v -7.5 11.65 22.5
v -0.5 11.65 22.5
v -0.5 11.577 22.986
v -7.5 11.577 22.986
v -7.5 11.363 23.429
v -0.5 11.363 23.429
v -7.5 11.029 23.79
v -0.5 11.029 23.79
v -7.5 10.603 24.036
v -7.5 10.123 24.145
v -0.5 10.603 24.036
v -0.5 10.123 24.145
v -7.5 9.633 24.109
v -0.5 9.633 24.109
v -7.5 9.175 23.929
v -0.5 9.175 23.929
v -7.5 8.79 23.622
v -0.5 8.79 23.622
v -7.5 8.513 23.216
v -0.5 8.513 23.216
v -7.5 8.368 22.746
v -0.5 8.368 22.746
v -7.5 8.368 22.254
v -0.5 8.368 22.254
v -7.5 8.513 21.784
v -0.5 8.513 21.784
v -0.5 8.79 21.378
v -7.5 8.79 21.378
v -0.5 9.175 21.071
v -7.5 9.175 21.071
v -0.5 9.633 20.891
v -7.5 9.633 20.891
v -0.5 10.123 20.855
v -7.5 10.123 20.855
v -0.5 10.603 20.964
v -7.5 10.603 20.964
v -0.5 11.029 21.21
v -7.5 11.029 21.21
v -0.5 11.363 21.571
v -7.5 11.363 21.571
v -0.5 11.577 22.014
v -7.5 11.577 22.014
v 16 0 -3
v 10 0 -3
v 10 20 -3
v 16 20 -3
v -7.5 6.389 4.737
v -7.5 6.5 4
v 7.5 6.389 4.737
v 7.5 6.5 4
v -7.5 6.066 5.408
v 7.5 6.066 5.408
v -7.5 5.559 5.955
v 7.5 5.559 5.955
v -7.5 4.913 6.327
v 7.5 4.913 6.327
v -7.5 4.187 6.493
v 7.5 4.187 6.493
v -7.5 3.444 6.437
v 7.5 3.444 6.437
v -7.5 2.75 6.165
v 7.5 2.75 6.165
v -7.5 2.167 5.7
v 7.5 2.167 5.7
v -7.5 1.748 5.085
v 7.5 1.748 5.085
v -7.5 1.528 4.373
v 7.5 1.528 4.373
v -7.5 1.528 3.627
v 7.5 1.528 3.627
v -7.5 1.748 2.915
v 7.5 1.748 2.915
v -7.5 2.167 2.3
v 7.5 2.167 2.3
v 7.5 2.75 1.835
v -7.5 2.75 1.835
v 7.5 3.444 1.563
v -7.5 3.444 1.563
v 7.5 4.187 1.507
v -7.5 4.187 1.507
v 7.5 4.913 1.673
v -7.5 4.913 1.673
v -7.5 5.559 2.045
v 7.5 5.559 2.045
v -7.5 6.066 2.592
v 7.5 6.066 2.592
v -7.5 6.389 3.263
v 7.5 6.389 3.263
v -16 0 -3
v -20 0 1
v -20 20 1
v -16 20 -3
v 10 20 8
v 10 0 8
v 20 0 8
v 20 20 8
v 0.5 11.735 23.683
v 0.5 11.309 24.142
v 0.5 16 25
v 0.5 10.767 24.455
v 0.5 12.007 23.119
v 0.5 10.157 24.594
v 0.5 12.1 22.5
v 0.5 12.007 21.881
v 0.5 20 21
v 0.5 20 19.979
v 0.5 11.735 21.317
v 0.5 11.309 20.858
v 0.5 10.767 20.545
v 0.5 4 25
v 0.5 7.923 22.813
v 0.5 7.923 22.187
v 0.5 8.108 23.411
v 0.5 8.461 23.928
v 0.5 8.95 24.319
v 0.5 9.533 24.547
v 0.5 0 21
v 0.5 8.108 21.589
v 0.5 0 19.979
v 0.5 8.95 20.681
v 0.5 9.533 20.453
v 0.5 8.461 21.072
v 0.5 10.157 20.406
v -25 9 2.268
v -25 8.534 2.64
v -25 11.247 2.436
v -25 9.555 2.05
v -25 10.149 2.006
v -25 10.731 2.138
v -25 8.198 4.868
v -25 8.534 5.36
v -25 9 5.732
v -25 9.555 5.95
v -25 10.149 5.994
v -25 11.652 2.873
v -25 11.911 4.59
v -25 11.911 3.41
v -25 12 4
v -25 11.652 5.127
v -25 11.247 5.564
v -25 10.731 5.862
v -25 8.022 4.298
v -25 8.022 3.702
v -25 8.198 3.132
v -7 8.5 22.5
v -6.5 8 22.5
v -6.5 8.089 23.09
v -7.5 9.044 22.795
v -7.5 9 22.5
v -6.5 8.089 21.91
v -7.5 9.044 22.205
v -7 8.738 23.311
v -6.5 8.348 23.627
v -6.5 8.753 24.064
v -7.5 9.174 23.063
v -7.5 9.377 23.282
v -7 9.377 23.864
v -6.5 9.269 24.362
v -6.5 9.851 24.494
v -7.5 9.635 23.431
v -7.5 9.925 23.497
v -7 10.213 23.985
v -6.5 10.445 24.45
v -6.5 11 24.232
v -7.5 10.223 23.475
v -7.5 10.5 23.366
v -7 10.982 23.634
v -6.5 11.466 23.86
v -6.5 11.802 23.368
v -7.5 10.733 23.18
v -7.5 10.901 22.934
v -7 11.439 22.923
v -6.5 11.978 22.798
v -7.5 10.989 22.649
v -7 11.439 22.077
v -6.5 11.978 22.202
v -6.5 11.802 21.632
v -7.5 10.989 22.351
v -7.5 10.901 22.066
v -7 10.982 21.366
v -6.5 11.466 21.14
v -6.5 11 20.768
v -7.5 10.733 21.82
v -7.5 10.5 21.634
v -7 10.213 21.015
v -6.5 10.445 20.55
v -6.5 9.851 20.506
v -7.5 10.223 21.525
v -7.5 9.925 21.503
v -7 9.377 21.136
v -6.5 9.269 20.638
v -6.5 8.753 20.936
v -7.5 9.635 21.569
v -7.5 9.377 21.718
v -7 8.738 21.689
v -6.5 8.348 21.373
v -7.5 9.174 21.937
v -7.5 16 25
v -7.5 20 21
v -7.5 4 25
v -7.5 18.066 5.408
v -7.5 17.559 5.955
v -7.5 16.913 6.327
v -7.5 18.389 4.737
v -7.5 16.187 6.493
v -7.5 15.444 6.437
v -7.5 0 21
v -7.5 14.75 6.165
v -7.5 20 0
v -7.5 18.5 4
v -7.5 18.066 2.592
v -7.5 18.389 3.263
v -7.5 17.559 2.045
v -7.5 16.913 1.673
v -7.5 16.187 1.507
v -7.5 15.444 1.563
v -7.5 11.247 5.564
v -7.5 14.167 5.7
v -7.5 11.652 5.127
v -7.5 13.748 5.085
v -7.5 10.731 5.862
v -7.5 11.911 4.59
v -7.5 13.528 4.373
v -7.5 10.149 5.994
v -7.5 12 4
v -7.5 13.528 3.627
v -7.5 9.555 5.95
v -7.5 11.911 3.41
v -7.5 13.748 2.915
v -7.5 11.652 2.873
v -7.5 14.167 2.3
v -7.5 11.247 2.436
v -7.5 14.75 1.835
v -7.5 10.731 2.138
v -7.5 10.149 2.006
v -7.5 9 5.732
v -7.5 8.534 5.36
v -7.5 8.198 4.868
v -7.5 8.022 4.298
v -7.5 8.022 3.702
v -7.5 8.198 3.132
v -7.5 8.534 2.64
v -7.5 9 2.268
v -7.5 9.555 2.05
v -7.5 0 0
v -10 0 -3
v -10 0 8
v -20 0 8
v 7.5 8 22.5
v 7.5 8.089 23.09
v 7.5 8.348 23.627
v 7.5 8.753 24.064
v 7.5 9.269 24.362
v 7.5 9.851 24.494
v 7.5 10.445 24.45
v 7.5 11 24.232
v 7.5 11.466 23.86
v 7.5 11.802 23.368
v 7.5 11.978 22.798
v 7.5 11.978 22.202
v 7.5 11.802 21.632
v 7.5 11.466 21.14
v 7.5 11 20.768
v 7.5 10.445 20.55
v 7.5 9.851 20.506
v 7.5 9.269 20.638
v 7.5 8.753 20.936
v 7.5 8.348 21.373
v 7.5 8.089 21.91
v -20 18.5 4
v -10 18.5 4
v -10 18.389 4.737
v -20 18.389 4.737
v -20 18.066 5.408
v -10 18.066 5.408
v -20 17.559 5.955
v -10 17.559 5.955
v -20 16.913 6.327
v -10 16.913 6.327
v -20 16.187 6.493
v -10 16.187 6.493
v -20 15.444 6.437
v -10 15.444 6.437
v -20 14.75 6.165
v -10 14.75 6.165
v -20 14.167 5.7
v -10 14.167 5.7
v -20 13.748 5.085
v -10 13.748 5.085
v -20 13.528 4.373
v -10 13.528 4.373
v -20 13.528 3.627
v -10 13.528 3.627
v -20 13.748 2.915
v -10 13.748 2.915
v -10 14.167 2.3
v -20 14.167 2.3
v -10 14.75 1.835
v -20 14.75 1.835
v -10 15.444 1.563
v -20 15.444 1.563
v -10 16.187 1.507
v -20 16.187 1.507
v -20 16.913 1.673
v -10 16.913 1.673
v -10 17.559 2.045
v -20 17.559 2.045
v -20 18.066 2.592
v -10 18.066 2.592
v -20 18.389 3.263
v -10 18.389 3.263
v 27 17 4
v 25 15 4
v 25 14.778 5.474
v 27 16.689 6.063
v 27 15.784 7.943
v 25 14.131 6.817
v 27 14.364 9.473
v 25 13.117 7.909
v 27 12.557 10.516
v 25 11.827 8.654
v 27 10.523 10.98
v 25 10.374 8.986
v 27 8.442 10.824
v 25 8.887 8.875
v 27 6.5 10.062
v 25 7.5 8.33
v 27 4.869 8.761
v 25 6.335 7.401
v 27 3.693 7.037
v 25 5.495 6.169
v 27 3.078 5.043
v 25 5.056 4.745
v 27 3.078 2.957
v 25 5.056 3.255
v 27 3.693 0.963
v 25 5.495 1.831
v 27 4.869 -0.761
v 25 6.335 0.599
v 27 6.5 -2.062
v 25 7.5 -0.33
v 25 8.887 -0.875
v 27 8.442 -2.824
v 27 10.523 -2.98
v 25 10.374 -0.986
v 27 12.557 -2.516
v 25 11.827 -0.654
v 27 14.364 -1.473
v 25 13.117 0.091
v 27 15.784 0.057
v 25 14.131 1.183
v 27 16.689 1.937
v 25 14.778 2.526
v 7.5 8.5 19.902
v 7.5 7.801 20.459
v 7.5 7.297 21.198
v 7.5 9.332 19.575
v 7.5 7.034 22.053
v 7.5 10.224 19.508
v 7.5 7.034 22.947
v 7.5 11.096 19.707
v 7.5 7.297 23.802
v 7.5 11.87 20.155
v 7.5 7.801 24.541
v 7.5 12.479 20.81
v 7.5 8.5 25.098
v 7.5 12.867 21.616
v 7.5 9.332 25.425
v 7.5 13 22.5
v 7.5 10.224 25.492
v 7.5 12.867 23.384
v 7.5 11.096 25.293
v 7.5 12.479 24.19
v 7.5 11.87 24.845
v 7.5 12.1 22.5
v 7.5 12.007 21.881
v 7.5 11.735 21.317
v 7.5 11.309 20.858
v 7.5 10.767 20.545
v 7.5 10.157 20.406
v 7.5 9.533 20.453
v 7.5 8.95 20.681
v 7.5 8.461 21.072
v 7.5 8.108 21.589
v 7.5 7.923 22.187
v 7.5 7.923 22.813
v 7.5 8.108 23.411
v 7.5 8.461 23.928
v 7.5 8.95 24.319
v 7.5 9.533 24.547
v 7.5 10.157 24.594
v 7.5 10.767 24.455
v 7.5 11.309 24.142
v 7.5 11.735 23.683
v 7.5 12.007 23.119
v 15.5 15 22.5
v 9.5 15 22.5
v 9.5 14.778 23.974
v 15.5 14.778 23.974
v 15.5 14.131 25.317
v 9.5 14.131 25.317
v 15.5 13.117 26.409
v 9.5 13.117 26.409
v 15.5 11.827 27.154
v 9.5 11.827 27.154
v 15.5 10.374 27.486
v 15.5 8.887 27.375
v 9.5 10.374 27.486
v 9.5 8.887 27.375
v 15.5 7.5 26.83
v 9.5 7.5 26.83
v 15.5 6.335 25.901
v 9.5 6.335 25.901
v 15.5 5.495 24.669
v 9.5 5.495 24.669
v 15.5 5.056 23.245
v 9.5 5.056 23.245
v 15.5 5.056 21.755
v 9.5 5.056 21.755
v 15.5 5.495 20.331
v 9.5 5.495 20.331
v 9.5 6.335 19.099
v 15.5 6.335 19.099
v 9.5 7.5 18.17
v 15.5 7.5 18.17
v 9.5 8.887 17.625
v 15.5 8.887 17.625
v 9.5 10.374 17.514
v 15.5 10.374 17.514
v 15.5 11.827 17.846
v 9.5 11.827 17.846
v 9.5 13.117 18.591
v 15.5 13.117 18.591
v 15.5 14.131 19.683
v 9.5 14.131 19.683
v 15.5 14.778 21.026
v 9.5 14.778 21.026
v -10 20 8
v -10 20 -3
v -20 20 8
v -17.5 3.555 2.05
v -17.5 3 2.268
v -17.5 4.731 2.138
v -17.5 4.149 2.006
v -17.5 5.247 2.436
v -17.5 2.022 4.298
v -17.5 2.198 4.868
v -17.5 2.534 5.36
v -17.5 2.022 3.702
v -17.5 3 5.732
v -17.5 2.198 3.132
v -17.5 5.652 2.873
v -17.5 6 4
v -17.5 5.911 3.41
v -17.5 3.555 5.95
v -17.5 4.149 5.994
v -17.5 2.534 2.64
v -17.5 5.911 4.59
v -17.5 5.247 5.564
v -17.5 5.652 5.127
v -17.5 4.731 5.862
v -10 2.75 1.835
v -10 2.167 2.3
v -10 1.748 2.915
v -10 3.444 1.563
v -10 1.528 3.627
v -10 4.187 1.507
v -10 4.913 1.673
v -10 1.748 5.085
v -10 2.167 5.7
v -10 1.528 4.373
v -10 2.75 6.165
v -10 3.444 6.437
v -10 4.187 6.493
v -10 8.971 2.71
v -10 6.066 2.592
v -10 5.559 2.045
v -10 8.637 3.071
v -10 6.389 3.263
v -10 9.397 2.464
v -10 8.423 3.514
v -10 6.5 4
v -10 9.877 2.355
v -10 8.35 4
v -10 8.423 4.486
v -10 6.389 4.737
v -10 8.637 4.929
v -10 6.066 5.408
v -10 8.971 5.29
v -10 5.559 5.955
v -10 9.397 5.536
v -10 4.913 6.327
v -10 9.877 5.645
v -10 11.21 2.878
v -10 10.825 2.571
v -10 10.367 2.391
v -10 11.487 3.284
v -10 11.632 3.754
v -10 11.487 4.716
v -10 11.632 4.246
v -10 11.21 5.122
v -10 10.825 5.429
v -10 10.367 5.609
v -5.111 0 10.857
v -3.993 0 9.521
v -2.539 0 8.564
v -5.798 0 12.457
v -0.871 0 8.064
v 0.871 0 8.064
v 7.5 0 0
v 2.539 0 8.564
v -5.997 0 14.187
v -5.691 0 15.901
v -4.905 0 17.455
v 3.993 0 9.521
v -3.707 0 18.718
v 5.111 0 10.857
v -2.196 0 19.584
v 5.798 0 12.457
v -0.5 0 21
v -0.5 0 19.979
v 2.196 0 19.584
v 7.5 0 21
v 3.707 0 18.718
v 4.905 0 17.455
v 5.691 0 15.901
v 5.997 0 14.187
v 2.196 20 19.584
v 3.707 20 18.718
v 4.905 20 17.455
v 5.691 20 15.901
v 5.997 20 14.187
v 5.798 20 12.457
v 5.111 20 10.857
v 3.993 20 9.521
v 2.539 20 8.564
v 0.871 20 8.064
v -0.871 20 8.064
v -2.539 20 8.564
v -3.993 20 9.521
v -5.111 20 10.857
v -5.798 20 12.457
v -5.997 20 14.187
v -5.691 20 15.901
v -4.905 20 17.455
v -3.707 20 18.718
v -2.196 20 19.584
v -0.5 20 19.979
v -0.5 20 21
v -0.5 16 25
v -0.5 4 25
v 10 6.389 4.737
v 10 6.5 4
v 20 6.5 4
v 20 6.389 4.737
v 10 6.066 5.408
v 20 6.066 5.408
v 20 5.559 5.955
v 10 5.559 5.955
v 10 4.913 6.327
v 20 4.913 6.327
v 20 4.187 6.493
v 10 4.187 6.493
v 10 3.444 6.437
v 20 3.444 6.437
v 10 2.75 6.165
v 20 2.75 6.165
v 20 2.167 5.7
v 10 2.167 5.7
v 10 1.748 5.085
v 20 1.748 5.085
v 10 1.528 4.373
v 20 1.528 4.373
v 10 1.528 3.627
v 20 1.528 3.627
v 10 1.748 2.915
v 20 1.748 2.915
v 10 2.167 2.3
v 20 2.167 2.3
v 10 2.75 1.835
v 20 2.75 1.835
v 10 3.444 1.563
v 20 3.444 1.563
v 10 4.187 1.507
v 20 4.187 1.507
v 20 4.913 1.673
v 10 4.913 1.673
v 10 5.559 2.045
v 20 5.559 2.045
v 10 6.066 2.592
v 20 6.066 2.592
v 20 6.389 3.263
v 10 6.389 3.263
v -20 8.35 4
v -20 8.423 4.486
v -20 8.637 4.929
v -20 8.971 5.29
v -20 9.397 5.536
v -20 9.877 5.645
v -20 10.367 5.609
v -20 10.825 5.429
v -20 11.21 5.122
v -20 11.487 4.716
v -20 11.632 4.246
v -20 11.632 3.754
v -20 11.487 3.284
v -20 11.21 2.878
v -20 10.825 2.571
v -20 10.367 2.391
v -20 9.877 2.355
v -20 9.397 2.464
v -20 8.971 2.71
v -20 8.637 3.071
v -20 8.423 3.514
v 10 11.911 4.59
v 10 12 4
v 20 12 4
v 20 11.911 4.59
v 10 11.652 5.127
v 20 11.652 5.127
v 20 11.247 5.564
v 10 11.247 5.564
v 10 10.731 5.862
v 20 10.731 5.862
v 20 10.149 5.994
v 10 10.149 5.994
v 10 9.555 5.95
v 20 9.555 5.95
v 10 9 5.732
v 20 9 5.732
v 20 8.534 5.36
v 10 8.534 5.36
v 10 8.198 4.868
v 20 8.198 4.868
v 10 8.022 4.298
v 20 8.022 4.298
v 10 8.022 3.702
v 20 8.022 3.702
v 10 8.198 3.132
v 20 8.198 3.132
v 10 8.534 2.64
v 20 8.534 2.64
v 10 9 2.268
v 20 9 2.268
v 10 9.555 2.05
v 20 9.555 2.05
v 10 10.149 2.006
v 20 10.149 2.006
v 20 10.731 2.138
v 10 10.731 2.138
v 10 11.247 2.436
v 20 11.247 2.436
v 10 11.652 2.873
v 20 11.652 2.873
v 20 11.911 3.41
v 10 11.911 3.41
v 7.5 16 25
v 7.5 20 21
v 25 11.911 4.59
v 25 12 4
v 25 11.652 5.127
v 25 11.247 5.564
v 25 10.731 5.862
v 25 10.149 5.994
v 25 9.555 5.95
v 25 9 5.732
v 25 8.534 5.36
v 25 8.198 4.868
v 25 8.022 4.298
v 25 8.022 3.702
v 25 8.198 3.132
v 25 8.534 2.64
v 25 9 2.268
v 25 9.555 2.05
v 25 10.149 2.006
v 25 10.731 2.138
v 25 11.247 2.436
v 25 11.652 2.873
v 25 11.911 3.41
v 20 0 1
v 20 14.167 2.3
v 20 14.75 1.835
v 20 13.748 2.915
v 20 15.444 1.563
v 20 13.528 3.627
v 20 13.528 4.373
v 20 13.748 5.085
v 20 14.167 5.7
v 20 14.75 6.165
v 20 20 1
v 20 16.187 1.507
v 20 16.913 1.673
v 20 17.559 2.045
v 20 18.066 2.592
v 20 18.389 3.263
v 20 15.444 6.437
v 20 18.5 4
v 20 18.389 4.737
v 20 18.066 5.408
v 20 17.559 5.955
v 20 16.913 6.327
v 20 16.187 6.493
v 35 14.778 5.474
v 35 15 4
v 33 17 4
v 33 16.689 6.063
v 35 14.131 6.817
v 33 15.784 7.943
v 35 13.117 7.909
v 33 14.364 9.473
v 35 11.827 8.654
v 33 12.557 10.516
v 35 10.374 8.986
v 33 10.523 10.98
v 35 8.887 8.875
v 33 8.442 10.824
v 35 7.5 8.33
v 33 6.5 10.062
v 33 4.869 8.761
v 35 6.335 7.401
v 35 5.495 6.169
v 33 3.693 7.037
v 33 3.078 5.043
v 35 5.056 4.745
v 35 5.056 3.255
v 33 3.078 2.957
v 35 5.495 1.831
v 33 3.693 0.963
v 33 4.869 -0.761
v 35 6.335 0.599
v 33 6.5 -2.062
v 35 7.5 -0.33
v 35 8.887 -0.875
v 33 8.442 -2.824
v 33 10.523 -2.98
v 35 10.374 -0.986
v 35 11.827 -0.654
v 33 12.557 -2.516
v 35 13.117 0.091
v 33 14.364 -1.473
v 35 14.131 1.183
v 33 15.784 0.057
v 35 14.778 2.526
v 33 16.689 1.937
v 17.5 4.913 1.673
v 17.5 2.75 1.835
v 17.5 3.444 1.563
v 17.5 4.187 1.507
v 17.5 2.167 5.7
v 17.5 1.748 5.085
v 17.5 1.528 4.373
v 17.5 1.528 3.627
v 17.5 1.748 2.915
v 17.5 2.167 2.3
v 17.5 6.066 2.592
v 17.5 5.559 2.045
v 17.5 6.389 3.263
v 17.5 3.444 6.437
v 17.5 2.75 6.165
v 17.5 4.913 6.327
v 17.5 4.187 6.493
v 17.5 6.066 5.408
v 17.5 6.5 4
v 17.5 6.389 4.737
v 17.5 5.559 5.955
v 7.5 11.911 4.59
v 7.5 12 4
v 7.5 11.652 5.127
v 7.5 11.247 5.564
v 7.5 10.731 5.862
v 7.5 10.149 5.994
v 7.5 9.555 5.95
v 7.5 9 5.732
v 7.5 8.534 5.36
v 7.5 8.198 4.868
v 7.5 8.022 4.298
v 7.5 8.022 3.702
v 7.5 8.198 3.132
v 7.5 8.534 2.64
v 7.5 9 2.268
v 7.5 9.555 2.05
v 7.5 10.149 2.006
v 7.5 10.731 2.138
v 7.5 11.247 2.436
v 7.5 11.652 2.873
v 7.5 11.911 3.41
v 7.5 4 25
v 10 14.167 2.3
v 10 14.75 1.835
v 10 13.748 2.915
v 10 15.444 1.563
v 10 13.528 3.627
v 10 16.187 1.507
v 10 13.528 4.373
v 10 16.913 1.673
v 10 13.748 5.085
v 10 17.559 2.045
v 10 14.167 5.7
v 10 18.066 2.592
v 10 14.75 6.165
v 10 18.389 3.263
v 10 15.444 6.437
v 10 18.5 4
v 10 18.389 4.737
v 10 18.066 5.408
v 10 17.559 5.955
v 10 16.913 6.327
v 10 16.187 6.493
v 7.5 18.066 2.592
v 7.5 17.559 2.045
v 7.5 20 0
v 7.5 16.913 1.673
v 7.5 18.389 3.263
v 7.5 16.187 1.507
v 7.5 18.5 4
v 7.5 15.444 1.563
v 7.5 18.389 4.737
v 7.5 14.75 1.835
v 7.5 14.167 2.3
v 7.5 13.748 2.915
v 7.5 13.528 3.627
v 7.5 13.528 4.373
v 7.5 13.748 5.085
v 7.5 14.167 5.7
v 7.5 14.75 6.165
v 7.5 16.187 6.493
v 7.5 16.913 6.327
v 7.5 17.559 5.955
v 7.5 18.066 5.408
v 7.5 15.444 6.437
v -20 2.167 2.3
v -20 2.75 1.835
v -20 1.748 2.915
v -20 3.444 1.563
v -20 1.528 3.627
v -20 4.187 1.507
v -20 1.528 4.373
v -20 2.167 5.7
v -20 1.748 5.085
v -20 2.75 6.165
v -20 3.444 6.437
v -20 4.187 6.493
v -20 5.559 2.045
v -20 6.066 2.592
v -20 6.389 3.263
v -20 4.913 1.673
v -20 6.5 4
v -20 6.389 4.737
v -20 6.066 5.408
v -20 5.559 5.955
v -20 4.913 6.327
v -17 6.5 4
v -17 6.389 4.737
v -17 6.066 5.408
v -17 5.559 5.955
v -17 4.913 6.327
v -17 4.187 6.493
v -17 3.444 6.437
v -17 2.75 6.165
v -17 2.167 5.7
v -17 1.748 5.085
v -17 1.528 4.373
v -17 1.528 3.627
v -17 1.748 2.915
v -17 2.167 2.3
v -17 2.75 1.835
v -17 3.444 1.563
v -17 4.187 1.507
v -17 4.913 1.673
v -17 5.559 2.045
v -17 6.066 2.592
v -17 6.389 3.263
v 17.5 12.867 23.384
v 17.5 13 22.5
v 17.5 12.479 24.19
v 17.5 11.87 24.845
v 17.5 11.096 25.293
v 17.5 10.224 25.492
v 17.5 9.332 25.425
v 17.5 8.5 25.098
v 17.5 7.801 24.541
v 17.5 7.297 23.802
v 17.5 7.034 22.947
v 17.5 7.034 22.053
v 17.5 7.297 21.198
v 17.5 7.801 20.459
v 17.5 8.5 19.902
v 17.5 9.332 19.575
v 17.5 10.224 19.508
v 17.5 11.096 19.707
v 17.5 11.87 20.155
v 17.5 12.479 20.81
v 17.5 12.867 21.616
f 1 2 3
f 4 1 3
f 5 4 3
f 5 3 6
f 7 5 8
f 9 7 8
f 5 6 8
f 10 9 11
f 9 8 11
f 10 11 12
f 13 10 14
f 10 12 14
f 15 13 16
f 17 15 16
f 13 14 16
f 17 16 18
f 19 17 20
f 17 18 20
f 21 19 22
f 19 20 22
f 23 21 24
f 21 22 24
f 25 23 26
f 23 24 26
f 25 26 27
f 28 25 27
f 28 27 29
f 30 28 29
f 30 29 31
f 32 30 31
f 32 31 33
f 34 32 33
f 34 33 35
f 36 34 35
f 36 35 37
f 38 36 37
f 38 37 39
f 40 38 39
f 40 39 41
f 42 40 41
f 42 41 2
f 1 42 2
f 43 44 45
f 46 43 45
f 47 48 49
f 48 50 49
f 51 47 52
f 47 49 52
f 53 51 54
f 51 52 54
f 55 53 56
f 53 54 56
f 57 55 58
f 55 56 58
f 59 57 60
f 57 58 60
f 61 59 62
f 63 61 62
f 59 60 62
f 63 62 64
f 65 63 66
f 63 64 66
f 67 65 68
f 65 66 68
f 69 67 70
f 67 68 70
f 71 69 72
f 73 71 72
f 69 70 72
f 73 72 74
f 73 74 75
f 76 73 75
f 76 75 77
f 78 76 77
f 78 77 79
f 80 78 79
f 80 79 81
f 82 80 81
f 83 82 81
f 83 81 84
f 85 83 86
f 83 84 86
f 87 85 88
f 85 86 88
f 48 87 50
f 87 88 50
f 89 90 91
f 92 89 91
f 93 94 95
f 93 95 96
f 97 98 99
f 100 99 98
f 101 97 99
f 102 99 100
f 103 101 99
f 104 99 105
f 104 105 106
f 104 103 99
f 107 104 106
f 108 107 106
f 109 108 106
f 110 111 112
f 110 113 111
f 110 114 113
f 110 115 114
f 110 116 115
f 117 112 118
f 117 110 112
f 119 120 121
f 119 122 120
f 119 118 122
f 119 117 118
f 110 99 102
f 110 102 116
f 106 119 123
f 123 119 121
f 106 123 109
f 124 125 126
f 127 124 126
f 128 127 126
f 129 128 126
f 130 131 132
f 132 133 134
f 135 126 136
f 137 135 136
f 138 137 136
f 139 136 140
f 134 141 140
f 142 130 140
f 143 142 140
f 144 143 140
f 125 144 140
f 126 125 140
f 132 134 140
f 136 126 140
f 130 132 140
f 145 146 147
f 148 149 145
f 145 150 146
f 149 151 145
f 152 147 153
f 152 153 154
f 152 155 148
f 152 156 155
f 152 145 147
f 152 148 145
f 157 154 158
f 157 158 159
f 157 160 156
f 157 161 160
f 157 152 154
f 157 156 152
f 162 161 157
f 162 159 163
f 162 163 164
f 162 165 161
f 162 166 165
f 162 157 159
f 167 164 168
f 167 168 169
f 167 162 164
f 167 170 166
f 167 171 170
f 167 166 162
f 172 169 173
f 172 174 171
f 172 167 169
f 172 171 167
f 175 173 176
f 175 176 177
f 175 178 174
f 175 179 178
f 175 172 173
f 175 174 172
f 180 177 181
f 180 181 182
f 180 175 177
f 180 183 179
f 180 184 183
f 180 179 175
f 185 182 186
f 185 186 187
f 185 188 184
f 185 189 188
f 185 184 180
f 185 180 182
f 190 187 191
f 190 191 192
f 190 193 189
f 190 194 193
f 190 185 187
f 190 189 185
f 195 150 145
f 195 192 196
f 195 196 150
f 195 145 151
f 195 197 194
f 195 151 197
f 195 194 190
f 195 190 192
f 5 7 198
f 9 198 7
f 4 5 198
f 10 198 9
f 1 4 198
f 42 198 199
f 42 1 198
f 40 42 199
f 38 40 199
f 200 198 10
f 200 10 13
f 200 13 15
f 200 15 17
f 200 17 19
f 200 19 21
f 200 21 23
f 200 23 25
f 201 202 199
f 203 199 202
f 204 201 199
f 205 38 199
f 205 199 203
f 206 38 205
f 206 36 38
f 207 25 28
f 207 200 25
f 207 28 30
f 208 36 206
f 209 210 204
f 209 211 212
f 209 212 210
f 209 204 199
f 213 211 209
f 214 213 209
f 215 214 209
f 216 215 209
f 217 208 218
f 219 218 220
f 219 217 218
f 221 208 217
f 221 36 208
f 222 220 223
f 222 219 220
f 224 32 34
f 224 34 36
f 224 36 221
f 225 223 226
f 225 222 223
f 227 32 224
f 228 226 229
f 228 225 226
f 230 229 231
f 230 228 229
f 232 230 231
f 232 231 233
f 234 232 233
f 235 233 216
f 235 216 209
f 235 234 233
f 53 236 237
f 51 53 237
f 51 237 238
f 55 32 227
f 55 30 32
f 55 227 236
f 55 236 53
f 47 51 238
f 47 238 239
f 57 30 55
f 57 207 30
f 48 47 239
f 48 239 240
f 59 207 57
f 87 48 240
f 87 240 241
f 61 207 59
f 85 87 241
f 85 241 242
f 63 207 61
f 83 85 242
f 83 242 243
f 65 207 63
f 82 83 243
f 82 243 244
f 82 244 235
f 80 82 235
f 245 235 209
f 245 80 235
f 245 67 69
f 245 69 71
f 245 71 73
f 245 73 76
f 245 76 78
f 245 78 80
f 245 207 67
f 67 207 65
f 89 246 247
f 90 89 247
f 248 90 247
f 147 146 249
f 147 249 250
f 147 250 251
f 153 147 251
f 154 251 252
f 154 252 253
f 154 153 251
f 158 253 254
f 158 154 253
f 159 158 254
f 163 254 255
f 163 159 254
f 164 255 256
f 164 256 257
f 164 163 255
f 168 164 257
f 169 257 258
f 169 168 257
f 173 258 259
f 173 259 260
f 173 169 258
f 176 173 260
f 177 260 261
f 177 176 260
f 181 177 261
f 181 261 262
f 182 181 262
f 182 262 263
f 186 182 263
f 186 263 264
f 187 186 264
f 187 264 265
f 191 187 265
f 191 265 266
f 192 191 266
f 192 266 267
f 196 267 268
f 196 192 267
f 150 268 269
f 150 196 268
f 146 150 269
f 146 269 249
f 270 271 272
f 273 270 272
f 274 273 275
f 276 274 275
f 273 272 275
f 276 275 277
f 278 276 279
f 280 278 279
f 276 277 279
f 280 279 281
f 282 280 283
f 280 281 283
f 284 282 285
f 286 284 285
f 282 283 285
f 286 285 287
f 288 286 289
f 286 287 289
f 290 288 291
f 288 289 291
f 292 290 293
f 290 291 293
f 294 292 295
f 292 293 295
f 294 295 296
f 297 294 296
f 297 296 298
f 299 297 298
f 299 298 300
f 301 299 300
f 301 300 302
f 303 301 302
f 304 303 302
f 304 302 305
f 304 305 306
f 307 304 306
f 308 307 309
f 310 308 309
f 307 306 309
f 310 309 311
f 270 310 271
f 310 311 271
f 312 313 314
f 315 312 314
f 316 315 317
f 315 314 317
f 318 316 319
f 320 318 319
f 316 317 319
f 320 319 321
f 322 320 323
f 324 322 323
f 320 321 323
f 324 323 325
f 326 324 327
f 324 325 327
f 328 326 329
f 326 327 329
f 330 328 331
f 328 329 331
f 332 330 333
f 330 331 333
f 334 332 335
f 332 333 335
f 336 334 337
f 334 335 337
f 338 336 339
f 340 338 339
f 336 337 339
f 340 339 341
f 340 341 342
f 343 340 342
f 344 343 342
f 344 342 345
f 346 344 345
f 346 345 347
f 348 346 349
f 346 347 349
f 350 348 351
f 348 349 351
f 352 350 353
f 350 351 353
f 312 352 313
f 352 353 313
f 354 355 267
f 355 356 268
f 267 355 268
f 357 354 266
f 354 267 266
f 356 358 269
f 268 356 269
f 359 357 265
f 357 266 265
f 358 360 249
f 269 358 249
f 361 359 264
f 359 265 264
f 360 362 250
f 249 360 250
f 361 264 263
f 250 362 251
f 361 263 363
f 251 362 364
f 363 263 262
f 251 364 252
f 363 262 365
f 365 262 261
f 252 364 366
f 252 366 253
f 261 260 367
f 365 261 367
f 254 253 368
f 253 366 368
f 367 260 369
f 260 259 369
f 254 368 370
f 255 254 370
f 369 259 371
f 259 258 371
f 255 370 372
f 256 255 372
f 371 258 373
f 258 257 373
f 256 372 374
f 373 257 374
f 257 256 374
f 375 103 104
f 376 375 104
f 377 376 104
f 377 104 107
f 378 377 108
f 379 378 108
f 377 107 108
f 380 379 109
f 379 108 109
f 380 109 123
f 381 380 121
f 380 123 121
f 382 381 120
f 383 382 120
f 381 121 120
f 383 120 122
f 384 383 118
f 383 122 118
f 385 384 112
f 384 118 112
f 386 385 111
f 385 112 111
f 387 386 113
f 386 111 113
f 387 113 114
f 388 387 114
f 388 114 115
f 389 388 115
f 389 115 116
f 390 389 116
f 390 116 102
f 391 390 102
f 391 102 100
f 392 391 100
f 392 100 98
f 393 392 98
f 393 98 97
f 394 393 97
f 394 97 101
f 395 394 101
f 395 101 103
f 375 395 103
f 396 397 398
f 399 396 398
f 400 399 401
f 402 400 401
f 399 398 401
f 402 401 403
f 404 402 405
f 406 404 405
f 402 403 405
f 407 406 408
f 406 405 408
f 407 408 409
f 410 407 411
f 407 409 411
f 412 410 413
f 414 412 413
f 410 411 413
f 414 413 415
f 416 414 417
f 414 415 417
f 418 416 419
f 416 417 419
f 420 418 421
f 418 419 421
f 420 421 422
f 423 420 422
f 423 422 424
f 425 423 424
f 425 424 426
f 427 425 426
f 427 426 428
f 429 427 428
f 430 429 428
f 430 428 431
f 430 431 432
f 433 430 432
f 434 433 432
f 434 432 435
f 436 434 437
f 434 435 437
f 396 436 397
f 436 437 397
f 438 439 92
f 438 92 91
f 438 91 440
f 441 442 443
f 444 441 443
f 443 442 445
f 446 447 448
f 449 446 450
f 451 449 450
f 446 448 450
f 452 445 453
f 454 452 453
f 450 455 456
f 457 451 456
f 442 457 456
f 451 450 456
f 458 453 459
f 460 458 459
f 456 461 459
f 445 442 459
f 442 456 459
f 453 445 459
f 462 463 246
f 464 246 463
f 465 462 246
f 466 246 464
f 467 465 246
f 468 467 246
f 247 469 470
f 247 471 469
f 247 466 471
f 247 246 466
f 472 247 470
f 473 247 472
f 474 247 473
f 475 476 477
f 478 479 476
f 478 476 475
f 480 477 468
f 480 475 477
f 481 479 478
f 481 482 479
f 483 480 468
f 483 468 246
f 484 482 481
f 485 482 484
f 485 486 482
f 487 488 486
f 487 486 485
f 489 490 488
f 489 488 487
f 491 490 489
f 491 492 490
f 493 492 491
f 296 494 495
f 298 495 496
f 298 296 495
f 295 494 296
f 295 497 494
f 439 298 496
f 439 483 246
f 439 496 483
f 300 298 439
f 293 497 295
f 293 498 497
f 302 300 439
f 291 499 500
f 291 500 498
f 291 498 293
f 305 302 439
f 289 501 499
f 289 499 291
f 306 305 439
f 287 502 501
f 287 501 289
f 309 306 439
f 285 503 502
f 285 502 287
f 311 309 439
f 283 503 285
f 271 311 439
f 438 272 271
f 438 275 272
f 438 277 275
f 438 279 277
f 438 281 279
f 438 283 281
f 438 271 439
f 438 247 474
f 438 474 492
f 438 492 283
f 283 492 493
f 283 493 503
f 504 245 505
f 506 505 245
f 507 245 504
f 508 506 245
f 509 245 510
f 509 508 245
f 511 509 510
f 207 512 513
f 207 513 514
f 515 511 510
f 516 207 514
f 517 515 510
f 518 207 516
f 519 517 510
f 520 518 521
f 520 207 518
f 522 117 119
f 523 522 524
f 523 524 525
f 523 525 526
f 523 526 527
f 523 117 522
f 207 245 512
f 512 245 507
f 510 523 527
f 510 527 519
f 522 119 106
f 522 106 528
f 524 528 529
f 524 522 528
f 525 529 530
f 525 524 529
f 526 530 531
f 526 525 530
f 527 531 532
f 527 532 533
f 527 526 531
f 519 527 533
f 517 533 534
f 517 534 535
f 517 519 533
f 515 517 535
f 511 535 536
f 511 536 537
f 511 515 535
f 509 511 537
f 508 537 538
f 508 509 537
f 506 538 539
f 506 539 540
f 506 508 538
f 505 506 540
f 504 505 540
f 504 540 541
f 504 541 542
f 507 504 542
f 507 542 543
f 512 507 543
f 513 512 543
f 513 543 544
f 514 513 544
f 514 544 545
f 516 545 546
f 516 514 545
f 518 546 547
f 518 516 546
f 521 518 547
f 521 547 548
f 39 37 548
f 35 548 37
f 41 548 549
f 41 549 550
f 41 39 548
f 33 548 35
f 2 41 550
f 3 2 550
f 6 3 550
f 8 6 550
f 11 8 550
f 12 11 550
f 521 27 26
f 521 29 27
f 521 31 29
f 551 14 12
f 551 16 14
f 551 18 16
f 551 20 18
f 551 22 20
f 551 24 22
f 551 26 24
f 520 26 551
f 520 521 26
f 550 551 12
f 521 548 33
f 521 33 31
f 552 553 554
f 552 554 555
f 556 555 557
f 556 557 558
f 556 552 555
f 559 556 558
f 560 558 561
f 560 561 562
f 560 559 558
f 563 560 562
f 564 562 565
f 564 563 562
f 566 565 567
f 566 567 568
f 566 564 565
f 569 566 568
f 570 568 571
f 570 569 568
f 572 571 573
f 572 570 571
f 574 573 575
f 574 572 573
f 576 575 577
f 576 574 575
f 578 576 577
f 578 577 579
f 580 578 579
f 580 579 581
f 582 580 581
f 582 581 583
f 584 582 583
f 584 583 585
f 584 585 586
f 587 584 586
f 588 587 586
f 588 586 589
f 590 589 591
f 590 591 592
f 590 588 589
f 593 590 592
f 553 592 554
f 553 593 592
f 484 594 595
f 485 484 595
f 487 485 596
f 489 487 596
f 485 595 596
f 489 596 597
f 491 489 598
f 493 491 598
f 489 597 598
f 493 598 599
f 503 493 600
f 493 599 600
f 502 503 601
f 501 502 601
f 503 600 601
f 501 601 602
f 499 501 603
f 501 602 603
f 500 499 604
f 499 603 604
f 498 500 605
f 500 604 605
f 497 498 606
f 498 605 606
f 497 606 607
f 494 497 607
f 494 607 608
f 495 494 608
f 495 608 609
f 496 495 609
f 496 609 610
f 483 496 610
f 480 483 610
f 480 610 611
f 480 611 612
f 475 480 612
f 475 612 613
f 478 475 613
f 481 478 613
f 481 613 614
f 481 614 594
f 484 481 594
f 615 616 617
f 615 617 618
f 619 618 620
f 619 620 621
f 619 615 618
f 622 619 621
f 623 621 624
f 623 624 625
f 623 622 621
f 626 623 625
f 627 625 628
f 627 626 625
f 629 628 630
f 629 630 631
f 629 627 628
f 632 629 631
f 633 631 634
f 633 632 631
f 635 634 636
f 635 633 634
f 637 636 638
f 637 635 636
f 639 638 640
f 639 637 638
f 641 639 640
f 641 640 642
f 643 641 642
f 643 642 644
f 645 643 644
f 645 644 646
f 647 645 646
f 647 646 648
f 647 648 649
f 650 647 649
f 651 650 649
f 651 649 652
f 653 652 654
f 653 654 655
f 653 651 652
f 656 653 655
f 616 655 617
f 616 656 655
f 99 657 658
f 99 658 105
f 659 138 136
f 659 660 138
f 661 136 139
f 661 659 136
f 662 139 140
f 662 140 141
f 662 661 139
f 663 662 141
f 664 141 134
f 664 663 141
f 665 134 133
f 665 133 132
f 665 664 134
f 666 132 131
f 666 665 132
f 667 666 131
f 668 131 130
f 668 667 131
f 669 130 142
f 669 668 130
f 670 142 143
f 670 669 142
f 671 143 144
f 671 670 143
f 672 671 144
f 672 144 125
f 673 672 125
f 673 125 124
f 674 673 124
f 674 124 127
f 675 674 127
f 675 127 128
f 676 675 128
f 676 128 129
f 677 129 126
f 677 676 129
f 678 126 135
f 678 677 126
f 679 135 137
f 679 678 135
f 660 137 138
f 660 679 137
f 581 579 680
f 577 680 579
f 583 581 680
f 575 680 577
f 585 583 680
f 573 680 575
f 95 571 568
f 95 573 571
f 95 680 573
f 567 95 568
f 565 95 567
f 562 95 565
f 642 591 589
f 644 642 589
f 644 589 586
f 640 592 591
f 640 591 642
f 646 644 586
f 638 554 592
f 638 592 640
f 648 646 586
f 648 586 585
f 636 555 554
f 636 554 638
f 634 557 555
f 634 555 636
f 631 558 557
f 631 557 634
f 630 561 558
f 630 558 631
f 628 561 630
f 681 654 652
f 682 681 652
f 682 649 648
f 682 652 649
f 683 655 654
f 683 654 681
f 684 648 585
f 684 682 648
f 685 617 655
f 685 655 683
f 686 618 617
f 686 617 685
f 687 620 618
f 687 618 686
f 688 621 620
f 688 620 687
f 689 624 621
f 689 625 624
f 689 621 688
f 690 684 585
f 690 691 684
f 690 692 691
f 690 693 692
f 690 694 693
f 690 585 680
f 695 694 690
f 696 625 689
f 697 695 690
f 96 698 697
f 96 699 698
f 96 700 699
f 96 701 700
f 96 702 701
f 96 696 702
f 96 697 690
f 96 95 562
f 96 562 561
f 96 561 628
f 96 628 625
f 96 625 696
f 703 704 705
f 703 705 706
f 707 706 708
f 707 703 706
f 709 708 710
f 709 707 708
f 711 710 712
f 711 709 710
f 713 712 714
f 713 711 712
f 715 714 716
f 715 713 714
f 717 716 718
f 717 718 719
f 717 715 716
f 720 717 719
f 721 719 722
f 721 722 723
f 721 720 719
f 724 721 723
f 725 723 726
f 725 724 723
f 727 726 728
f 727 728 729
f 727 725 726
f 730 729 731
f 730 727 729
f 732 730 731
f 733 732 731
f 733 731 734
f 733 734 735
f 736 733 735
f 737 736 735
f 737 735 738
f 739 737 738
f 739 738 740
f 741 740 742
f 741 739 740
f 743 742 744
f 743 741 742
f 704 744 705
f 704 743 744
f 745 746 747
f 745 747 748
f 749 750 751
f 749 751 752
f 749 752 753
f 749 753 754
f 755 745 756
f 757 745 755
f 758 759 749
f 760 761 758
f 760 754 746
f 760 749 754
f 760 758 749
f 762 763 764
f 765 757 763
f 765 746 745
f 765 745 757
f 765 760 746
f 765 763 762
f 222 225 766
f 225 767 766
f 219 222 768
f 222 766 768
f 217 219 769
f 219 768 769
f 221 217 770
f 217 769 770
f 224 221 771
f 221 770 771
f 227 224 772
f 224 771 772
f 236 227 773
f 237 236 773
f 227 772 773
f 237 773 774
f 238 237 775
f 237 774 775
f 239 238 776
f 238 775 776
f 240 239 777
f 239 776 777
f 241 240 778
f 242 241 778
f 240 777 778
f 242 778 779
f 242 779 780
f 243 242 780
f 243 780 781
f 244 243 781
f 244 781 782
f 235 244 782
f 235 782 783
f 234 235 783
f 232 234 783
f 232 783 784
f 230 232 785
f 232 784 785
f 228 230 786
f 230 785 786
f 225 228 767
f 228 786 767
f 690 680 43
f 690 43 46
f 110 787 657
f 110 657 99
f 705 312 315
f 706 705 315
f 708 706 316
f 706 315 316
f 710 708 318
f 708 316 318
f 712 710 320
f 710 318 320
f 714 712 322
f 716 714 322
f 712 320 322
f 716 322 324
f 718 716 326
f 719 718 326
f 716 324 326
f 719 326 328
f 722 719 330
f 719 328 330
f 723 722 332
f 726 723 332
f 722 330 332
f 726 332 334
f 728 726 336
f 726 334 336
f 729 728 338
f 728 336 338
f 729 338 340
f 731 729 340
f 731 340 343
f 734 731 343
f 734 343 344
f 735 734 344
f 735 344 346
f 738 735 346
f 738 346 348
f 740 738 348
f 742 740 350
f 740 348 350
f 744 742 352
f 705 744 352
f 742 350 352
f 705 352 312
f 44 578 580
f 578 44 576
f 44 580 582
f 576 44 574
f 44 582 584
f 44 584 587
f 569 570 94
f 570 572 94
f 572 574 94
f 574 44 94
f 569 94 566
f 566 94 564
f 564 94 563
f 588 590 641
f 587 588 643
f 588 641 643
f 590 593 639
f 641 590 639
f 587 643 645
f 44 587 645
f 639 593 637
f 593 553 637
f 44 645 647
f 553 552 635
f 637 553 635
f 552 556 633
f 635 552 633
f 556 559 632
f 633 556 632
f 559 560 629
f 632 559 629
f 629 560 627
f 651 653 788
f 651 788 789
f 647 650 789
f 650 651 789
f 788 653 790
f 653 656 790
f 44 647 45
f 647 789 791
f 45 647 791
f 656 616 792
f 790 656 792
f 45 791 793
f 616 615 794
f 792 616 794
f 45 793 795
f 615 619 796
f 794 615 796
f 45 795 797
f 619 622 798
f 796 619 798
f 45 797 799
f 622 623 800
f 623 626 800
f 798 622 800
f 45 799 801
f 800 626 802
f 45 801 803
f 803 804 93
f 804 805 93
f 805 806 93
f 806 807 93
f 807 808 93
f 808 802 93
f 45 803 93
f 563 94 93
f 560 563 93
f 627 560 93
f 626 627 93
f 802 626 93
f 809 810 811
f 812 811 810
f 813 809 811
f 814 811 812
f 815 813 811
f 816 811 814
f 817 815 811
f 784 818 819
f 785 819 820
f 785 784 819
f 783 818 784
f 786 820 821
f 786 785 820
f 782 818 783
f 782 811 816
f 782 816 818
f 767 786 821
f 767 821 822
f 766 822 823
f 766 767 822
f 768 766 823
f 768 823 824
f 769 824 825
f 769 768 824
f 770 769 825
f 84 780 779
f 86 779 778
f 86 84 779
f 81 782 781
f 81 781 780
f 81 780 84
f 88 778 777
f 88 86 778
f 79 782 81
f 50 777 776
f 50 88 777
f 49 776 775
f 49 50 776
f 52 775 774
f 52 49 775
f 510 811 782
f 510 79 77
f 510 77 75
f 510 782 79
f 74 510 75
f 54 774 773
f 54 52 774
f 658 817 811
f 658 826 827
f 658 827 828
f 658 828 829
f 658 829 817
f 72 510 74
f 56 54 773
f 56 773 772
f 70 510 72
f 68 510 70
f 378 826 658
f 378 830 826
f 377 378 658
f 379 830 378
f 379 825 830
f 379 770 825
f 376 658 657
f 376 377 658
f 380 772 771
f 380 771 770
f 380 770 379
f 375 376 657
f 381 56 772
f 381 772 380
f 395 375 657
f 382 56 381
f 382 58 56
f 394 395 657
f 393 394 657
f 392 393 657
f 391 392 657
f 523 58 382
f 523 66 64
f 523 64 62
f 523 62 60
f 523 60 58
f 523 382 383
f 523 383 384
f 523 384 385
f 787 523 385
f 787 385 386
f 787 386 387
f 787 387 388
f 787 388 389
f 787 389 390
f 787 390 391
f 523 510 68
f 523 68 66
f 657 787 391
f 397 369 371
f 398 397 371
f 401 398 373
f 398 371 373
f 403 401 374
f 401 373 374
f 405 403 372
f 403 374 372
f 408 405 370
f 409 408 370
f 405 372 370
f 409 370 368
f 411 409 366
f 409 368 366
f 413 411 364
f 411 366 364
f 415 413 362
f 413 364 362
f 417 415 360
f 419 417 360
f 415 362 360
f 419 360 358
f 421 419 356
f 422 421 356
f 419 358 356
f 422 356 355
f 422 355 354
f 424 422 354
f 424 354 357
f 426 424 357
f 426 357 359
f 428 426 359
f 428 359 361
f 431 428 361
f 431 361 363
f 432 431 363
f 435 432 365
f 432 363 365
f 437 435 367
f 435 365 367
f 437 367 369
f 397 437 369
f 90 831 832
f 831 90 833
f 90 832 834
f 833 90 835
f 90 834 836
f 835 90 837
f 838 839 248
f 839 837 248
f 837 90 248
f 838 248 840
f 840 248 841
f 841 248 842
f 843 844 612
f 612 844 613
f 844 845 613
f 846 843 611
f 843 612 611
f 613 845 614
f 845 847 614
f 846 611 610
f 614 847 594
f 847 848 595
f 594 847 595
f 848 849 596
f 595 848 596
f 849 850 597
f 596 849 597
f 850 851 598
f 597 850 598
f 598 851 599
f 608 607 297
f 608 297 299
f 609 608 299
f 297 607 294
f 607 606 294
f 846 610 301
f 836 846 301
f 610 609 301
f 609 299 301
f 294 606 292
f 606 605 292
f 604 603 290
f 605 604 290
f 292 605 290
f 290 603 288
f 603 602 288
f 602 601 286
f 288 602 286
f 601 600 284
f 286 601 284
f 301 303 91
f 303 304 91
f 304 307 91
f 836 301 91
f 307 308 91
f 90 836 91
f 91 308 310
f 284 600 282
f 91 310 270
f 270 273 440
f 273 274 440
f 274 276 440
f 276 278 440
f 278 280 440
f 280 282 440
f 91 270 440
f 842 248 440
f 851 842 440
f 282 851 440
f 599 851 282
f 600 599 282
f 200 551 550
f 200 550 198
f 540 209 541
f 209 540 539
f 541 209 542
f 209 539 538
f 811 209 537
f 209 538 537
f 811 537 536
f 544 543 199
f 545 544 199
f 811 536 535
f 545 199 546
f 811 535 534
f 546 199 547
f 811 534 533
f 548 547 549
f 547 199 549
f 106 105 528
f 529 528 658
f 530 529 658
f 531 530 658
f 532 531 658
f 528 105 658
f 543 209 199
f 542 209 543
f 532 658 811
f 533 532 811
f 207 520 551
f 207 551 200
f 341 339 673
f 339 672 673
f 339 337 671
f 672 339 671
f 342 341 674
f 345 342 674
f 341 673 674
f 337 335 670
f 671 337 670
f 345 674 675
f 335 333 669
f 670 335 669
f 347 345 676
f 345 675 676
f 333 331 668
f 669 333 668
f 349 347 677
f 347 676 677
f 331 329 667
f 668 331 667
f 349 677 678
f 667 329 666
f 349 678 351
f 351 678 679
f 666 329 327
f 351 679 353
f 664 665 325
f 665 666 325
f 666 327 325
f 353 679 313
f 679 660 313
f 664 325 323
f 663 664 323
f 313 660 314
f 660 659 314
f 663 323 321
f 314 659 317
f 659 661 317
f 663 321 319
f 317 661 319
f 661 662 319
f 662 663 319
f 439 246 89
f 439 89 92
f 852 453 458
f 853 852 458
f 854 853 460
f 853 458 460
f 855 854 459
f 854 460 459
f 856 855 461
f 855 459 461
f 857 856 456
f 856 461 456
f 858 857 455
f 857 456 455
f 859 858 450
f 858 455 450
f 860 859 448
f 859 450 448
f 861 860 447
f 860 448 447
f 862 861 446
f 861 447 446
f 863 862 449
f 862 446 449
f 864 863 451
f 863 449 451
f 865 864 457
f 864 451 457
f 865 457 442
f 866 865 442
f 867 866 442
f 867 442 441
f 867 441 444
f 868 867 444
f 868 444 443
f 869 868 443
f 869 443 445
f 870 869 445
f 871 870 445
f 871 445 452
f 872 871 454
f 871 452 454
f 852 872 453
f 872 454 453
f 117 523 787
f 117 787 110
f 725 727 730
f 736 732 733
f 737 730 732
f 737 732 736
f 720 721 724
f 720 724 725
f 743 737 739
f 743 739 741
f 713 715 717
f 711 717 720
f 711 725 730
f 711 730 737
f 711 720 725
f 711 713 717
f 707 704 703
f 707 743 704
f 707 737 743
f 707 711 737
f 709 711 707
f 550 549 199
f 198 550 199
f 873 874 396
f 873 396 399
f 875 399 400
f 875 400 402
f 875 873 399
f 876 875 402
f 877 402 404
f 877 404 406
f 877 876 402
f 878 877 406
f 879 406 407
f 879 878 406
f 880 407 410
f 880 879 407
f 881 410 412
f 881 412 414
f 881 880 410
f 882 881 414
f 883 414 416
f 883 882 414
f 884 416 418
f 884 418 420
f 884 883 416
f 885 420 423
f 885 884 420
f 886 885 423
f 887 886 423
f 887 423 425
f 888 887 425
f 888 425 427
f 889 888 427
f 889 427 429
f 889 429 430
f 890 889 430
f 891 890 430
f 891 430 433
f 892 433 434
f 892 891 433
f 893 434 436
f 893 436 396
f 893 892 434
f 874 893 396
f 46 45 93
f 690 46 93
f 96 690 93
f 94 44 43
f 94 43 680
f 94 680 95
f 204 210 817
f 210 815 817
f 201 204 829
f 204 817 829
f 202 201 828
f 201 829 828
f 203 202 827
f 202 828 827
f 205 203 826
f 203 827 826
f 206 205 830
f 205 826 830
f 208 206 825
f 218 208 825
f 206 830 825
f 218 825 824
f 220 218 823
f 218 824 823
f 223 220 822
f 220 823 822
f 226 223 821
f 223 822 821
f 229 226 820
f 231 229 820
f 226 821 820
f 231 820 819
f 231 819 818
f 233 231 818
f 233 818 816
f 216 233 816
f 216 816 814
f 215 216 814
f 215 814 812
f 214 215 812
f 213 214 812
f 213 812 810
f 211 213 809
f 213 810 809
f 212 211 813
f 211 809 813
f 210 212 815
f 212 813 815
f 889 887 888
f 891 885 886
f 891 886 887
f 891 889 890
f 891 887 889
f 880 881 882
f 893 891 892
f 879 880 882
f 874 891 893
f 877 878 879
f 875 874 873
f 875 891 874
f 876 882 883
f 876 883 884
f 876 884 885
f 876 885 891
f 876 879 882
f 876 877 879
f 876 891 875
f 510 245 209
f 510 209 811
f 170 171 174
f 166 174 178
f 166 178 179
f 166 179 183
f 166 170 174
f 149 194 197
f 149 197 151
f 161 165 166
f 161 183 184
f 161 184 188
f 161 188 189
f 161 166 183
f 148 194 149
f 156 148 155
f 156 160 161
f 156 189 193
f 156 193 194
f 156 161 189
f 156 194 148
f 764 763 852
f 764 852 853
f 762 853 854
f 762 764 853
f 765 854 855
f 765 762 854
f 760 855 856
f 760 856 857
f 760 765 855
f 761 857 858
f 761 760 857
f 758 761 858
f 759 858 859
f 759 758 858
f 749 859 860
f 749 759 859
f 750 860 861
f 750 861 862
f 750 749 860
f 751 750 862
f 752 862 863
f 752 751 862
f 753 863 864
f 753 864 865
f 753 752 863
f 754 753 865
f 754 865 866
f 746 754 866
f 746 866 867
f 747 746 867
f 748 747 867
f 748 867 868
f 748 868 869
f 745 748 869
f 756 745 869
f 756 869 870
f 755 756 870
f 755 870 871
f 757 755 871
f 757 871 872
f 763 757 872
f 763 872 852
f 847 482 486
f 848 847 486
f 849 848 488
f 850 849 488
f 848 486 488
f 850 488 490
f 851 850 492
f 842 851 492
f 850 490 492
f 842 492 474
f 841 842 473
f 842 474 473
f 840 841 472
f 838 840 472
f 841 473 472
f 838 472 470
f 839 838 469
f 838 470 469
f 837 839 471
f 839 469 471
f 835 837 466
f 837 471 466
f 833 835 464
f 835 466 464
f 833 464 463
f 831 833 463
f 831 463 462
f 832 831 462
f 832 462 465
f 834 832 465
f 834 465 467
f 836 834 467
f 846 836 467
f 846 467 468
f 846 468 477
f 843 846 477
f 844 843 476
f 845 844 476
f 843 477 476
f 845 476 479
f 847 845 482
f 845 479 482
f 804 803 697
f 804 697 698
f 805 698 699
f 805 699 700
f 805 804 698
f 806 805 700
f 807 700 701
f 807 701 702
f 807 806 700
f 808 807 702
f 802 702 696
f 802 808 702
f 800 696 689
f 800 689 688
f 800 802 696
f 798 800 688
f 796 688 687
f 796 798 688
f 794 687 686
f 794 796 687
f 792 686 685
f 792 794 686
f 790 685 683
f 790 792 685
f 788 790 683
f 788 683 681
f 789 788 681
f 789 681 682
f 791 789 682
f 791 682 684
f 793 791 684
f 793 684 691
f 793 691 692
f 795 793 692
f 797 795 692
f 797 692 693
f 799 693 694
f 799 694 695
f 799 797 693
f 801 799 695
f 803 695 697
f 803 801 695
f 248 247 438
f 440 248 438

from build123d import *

# Parameters (mm, degrees)
F1_DEPTH      = 20
F2_R          = 2.5
F2_R_2        = 2
F3_DEPTH      = 7.501
F3_DEPTH_BACK = 7.501
F4_DEPTH      = 17.5
F5_START      = 10
F2_W          = 20
F2_H          = 11
F5_DEPTH      = 10
F6_START      = -10
F6_DEPTH      = 10
F7_D          = 3.3
F8_SIZE       = 4
F8_2_SIZE     = 4
F9_SIZE       = 4
F10_DEPTH     = 25
F11_R         = 7
F12_DEPTH     = 10
F14_D         = 3.3
F14_DEPTH     = 7.501
F15_D         = 4.2
F15_DEPTH     = 7.501
F16_SIZE      = 0.5
F17_R         = 2
F18_DEPTH     = 15
F19_R         = 5
F20_DEPTH     = 10
F21_SIZE      = 2
F21_2_SIZE    = 2
F22_SIZE      = 1


with BuildPart() as f1:
    # F0 (on Front) → F1 (new body)
    with BuildSketch(Plane.XZ):
        with BuildLine():
            Line((-0.5, 25), (-7.5, 25))
            Line((-7.5, 25), (-7.5, 0))
            Line((-7.5, 0), (7.5, 0))
            Line((7.5, 0), (7.5, 25))
            Line((7.5, 25), (0.5, 25))
            Line((0.5, 25), (0.5, 19.9791303716))
            ThreePointArc((0.5, 19.9791303716), (0, 8), (-0.5, 19.9791303716))
            Line((-0.5, 19.9791303716), (-0.5, 25))
        make_face()
    extrude(amount=-F1_DEPTH)

    # F2 (on Right) → F3 (cut, two sides)
    with BuildSketch(Plane.YZ) as f3_sk:
        with Locations((4, 4)):
            Circle(F2_R)
        with Locations((10, 4)):
            Circle(F2_R_2)
        with Locations((16, 4)):
            Circle(F2_R)
    extrude(amount=F3_DEPTH, mode=Mode.SUBTRACT)
    extrude(f3_sk.sketch, amount=-F3_DEPTH_BACK, mode=Mode.SUBTRACT)

    # F9
    f9_edges = [f1.edges().sort_by_distance(p)[0] for p in [
        (4, 0, 25),
        (-4, 0, 25),
        (-4, 20, 25),
        (4, 20, 25),
    ]]
    chamfer(f9_edges, length=F9_SIZE)

    # F14 (through all, one way)
    with BuildSketch(Plane.YZ):
        with Locations((10, 22.5)):
            Circle(F14_D / 2)
    extrude(amount=-F14_DEPTH, mode=Mode.SUBTRACT)

    # F15 (through all, one way)
    with BuildSketch(Plane(origin=(0, 0, 0), x_dir=(0, 1, 0), z_dir=(-1, 0, 0))):
        with Locations((10, -22.5)):
            Circle(F15_D / 2)
    extrude(amount=-F15_DEPTH, mode=Mode.SUBTRACT)


with BuildPart() as f4:
    # F2 (on Right) → F4 (new body, symmetric)
    with BuildSketch(Plane.YZ):
        with Locations((4, 4)):
            Circle(F2_R)
    extrude(amount=F4_DEPTH, both=True)

    # F16
    f16_edges = [f4.edges().sort_by_distance(p)[0] for p in [
        (-17.5, 1.5, 4),
    ]]
    chamfer(f16_edges, length=F16_SIZE)


with BuildPart() as f5:
    # F2 (on Right) → F5 (new body)
    with BuildSketch(Plane.YZ.offset(F5_START)):
        with Locations((10, 2.5)):
            Rectangle(F2_W, F2_H)
        with Locations((4, 4)):
            Circle(F2_R, mode=Mode.SUBTRACT)
        with Locations((10, 4)):
            Circle(F2_R_2, mode=Mode.SUBTRACT)
        with Locations((16, 4)):
            Circle(F2_R, mode=Mode.SUBTRACT)
    extrude(amount=F5_DEPTH)

    # F8
    f8_edges = [f5.edges().sort_by_distance(p)[0] for p in [
        (20, 10, -3),
    ]]
    chamfer(f8_edges, length=F8_SIZE)


with BuildPart() as f6:
    # F2 (on Right) → F6 (new body)
    with BuildSketch(Plane.YZ.offset(F6_START)):
        with Locations((10, 2.5)):
            Rectangle(F2_W, F2_H)
        with Locations((4, 4)):
            Circle(F2_R, mode=Mode.SUBTRACT)
        with Locations((10, 4)):
            Circle(F2_R_2, mode=Mode.SUBTRACT)
        with Locations((16, 4)):
            Circle(F2_R, mode=Mode.SUBTRACT)
        with Locations((10, 4)):
            Circle(F2_R_2)
    extrude(amount=-F6_DEPTH)

    # F7 (through all)
    with Locations(Plane.YZ):
        with Locations((10, 4)):
            Hole(F7_D / 2)

    # F8#2
    f8_2_edges = [f6.edges().sort_by_distance(p)[0] for p in [
        (-20, 10, -3),
    ]]
    chamfer(f8_2_edges, length=F8_2_SIZE)


with BuildPart() as f10:
    # F2 (on Right) → F10 (new body, symmetric)
    with BuildSketch(Plane.YZ):
        with Locations((10, 4)):
            Circle(F2_R_2)
    extrude(amount=F10_DEPTH, both=True)

    # F11 (on face) → F12 (join)
    with BuildSketch(Plane.YZ.offset(25)):
        with Locations((10, 4)):
            Circle(F11_R)
    extrude(amount=F12_DEPTH)

    # F21
    f21_edges = [f10.edges().sort_by_distance(p)[0] for p in [
        (30, 17, 4),
        (25, 3, 4),
        (35, 3, 4),
    ]]
    chamfer(f21_edges, length=F21_SIZE)


with BuildPart() as f18:
    # F17 (on face) → F18 (new body, through all)
    with BuildSketch(Plane(origin=(-7.5, 0, 0), x_dir=(0, -1, 0), z_dir=(-1, 0, 0))):
        with Locations((-10, 22.5)):
            Circle(F17_R)
    extrude(amount=-F18_DEPTH)

    # F19 (on face) → F20 (join)
    with BuildSketch(Plane.YZ.offset(7.5)):
        with Locations((10, 22.5)):
            Circle(F19_R)
    extrude(amount=F20_DEPTH)

    # F21#2
    f21_2_edges = [f18.edges().sort_by_distance(p)[0] for p in [
        (12.5, 15, 22.5),
        (7.5, 5, 22.5),
        (17.5, 5, 22.5),
    ]]
    chamfer(f21_2_edges, length=F21_2_SIZE)

    # F22
    f22_edges = [f18.edges().sort_by_distance(p)[0] for p in [
        (-7.5, 12, 22.5),
    ]]
    chamfer(f22_edges, length=F22_SIZE)


solid = Compound([f1.part, f4.part, f5.part, f6.part, f10.part, f18.part])
